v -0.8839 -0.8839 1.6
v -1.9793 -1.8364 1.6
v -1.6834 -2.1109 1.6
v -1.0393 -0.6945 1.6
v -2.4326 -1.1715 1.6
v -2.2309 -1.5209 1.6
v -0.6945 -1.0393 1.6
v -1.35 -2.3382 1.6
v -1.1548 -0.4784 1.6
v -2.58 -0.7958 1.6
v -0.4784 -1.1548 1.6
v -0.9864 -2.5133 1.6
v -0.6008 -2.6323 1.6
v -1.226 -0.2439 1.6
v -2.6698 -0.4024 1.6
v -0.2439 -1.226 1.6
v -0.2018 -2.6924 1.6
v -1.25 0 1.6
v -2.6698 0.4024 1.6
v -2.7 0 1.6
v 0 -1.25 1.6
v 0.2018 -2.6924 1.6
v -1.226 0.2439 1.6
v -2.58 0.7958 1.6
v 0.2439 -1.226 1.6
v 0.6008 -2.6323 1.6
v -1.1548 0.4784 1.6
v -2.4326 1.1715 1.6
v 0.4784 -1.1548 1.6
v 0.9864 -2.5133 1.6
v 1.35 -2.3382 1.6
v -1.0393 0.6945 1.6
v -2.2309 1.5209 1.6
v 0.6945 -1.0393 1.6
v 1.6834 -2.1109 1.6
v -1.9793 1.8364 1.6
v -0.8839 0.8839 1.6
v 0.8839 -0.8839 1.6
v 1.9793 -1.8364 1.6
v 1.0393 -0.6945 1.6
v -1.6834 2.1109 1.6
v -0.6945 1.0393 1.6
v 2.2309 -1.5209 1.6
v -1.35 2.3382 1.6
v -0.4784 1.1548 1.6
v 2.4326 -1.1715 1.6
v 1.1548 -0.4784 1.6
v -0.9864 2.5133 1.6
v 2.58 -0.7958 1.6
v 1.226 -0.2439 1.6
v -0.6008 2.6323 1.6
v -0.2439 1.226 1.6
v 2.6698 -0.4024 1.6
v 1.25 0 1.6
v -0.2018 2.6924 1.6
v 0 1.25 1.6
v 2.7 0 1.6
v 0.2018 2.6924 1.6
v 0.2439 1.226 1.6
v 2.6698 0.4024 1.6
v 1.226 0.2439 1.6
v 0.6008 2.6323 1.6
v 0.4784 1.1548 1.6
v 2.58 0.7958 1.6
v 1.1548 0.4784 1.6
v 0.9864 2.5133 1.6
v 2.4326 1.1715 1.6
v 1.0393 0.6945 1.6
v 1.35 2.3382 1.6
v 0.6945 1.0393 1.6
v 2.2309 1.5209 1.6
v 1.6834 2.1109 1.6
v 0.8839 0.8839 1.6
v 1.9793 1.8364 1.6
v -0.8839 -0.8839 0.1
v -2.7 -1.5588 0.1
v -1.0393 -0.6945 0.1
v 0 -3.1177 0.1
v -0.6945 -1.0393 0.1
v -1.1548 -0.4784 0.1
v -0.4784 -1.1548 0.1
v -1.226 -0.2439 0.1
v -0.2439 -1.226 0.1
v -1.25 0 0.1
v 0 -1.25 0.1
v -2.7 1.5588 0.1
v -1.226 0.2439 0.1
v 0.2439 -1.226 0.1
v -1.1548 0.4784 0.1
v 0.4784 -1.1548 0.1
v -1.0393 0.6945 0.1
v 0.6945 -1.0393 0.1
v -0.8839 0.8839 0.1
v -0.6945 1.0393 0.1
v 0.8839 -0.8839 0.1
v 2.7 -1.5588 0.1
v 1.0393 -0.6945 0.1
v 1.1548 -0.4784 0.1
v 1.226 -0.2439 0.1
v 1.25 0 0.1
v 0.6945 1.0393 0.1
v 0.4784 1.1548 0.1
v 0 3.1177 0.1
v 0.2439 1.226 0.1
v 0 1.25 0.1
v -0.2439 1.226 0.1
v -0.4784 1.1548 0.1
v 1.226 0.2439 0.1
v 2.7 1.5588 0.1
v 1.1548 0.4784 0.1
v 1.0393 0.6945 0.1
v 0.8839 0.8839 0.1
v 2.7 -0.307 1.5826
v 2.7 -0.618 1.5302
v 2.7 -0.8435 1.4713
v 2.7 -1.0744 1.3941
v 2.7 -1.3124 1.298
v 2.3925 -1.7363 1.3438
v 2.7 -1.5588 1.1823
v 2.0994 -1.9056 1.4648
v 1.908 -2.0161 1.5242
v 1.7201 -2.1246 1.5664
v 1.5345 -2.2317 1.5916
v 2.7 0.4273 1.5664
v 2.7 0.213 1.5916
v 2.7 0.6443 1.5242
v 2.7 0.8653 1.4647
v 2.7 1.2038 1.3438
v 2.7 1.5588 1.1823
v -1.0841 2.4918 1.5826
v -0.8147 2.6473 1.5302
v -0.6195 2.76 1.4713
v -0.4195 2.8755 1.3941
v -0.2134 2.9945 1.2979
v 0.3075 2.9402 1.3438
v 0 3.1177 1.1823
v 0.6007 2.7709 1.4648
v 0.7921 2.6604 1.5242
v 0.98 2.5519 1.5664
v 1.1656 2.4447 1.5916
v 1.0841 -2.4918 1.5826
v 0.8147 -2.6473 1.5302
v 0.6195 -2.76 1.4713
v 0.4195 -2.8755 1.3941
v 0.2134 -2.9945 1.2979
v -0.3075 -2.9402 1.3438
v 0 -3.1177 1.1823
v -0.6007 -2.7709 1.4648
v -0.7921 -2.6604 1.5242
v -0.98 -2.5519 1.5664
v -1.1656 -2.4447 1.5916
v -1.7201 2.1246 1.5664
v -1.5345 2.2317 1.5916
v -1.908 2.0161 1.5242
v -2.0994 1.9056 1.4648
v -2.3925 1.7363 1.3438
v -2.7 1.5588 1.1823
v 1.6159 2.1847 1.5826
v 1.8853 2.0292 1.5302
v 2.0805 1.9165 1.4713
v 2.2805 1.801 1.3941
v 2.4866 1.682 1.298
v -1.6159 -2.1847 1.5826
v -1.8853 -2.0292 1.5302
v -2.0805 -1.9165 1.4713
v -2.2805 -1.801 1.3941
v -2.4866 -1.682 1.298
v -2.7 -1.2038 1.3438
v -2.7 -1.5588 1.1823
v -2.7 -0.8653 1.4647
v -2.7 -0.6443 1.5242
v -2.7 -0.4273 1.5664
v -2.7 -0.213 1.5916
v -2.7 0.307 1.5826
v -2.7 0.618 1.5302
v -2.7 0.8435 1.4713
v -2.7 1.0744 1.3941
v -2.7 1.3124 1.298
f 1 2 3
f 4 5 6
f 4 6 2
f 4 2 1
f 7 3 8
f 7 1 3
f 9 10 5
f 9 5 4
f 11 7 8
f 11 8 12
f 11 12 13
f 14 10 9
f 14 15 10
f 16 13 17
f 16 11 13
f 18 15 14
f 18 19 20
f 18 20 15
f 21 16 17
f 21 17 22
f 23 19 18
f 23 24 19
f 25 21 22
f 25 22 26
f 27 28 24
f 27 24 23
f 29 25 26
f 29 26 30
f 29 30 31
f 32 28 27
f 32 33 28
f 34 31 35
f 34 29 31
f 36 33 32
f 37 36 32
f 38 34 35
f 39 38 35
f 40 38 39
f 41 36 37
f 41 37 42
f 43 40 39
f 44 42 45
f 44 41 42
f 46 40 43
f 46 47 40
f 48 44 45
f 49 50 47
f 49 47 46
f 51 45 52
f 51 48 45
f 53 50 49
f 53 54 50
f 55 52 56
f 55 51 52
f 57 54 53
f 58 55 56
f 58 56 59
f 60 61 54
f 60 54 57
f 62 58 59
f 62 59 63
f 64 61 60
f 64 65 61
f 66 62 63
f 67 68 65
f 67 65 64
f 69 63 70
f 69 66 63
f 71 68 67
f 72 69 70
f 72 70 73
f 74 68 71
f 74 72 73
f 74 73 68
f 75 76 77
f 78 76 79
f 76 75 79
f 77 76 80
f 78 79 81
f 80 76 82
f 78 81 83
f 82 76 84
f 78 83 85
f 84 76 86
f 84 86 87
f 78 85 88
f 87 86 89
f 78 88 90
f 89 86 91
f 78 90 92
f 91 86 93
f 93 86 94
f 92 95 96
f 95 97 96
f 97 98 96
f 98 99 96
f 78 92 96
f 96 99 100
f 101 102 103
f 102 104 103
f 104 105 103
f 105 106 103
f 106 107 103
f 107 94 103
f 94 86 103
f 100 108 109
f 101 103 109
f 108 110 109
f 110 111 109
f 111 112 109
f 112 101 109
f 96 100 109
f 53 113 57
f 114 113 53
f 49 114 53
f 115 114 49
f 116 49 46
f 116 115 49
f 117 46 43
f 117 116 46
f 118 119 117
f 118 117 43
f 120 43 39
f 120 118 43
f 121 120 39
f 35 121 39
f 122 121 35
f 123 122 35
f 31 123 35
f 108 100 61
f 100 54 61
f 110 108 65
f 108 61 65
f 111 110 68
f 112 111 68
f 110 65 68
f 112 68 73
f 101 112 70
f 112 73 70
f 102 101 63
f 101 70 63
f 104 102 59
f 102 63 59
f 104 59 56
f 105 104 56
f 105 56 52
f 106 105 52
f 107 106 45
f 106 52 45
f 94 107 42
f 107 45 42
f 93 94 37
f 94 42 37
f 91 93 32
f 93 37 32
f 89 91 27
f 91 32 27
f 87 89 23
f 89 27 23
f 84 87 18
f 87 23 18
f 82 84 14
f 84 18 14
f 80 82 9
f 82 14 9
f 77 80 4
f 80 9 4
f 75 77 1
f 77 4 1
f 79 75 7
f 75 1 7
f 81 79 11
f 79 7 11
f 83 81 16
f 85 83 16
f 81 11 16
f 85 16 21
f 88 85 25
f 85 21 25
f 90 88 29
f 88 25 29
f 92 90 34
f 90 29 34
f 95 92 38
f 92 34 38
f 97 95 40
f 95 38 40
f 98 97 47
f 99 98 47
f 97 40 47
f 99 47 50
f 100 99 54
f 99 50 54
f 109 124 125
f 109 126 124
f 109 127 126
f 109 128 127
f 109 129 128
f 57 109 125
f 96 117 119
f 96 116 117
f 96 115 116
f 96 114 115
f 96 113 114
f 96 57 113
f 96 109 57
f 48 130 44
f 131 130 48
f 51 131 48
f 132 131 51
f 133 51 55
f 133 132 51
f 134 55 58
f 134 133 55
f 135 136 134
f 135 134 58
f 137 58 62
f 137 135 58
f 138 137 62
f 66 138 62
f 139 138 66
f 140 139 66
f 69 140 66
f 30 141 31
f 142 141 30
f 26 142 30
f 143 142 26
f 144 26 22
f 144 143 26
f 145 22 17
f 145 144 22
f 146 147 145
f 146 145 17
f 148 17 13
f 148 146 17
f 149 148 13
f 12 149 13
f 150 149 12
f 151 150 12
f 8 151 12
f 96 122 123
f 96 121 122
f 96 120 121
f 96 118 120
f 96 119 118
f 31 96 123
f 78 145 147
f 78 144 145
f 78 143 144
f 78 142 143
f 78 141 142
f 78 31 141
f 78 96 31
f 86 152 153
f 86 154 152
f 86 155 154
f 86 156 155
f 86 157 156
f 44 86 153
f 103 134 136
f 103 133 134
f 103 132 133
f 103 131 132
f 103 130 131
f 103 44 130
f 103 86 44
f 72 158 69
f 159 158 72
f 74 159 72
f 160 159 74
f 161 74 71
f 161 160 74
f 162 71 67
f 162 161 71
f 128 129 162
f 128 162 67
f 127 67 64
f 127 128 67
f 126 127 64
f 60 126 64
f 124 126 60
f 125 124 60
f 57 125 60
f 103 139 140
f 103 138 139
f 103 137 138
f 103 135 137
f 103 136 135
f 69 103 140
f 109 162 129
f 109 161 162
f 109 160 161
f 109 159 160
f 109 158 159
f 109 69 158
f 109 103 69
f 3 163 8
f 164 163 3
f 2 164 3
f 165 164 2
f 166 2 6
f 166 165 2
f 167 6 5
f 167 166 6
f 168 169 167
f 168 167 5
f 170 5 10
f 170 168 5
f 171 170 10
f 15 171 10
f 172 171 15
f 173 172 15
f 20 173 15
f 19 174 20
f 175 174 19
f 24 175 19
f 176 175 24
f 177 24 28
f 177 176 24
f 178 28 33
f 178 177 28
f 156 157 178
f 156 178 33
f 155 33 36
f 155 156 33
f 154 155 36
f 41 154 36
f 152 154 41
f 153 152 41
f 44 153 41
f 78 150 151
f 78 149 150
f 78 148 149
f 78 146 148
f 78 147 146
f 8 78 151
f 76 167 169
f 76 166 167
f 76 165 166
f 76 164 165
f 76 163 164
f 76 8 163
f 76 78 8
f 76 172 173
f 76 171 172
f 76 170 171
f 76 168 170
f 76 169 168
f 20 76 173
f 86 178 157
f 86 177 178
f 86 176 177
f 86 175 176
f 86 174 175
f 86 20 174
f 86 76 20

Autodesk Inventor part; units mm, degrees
ref_plane "YZ-Ebene" through (0, 0, 0) normal (1, 0, 0) x (0, 1, 0)
ref_plane "XZ-Ebene" through (0, 0, 0) normal (0, 1, 0) x (-1, 0, 0)
ref_plane "XY-Ebene" through (0, 0, 0) normal (0, 0, 1) x (1, 0, 0)
sketch "Skizze1" plane through (0, 0, 0) normal (0, 0, 1) x (1, 0, 0)
  line L0 (-3.78, 0) -> (3.78, 0) projected
  line L1 (0, -4.3648) -> (0, 4.3648) projected
  line L2 (0, 3.1177) -> (2.7, 1.5588)
  line L3 (2.7, 1.5588) -> (2.7, -1.5588)
  line L4 (2.7, -1.5588) -> (0, -3.1177)
  line L5 (0, -3.1177) -> (-2.7, -1.5588)
  line L6 (-2.7, -1.5588) -> (-2.7, 1.5588)
  line L7 (-2.7, 1.5588) -> (0, 3.1177)
  point P0 (0, 0)
  point P1 (0, 0)
  dimension "d0" = 5.4
extrude "Extrusion1" add sketch "Skizze1" along normal blind 1.6
sketch "Skizze2" plane through (0, 0, 1.6) normal (0, 0, 1) x (1, 0, 0)
  line L0 (0, 3.1177) -> (-2.7, 1.5588) projected
  circle A0 centre (0, 0) radius 2.7
extrude "Extrusion2" cut sketch "Skizze2" against normal blind 1.5 draft 45 keep common part
sketch "Skizze3" plane through (0, 0, 1.6) normal (0, 0, 1) x (1, 0, 0)
  arc A0 (-2.7, 0) -> (-1.35, -2.3383) centre (0, 0) ccw projected
  circle A1 centre (0, 0) radius 1.25
  dimension "d5" = 2.5
extrude "Extrusion3" cut sketch "Skizze3" against normal blind 1.5
thread "Gewinde1" size "M3x0.5" class "6H" standard "ANSI Metric M Profile" length 7
properties part number "Mutter_ra8846s" material "Stahl"
